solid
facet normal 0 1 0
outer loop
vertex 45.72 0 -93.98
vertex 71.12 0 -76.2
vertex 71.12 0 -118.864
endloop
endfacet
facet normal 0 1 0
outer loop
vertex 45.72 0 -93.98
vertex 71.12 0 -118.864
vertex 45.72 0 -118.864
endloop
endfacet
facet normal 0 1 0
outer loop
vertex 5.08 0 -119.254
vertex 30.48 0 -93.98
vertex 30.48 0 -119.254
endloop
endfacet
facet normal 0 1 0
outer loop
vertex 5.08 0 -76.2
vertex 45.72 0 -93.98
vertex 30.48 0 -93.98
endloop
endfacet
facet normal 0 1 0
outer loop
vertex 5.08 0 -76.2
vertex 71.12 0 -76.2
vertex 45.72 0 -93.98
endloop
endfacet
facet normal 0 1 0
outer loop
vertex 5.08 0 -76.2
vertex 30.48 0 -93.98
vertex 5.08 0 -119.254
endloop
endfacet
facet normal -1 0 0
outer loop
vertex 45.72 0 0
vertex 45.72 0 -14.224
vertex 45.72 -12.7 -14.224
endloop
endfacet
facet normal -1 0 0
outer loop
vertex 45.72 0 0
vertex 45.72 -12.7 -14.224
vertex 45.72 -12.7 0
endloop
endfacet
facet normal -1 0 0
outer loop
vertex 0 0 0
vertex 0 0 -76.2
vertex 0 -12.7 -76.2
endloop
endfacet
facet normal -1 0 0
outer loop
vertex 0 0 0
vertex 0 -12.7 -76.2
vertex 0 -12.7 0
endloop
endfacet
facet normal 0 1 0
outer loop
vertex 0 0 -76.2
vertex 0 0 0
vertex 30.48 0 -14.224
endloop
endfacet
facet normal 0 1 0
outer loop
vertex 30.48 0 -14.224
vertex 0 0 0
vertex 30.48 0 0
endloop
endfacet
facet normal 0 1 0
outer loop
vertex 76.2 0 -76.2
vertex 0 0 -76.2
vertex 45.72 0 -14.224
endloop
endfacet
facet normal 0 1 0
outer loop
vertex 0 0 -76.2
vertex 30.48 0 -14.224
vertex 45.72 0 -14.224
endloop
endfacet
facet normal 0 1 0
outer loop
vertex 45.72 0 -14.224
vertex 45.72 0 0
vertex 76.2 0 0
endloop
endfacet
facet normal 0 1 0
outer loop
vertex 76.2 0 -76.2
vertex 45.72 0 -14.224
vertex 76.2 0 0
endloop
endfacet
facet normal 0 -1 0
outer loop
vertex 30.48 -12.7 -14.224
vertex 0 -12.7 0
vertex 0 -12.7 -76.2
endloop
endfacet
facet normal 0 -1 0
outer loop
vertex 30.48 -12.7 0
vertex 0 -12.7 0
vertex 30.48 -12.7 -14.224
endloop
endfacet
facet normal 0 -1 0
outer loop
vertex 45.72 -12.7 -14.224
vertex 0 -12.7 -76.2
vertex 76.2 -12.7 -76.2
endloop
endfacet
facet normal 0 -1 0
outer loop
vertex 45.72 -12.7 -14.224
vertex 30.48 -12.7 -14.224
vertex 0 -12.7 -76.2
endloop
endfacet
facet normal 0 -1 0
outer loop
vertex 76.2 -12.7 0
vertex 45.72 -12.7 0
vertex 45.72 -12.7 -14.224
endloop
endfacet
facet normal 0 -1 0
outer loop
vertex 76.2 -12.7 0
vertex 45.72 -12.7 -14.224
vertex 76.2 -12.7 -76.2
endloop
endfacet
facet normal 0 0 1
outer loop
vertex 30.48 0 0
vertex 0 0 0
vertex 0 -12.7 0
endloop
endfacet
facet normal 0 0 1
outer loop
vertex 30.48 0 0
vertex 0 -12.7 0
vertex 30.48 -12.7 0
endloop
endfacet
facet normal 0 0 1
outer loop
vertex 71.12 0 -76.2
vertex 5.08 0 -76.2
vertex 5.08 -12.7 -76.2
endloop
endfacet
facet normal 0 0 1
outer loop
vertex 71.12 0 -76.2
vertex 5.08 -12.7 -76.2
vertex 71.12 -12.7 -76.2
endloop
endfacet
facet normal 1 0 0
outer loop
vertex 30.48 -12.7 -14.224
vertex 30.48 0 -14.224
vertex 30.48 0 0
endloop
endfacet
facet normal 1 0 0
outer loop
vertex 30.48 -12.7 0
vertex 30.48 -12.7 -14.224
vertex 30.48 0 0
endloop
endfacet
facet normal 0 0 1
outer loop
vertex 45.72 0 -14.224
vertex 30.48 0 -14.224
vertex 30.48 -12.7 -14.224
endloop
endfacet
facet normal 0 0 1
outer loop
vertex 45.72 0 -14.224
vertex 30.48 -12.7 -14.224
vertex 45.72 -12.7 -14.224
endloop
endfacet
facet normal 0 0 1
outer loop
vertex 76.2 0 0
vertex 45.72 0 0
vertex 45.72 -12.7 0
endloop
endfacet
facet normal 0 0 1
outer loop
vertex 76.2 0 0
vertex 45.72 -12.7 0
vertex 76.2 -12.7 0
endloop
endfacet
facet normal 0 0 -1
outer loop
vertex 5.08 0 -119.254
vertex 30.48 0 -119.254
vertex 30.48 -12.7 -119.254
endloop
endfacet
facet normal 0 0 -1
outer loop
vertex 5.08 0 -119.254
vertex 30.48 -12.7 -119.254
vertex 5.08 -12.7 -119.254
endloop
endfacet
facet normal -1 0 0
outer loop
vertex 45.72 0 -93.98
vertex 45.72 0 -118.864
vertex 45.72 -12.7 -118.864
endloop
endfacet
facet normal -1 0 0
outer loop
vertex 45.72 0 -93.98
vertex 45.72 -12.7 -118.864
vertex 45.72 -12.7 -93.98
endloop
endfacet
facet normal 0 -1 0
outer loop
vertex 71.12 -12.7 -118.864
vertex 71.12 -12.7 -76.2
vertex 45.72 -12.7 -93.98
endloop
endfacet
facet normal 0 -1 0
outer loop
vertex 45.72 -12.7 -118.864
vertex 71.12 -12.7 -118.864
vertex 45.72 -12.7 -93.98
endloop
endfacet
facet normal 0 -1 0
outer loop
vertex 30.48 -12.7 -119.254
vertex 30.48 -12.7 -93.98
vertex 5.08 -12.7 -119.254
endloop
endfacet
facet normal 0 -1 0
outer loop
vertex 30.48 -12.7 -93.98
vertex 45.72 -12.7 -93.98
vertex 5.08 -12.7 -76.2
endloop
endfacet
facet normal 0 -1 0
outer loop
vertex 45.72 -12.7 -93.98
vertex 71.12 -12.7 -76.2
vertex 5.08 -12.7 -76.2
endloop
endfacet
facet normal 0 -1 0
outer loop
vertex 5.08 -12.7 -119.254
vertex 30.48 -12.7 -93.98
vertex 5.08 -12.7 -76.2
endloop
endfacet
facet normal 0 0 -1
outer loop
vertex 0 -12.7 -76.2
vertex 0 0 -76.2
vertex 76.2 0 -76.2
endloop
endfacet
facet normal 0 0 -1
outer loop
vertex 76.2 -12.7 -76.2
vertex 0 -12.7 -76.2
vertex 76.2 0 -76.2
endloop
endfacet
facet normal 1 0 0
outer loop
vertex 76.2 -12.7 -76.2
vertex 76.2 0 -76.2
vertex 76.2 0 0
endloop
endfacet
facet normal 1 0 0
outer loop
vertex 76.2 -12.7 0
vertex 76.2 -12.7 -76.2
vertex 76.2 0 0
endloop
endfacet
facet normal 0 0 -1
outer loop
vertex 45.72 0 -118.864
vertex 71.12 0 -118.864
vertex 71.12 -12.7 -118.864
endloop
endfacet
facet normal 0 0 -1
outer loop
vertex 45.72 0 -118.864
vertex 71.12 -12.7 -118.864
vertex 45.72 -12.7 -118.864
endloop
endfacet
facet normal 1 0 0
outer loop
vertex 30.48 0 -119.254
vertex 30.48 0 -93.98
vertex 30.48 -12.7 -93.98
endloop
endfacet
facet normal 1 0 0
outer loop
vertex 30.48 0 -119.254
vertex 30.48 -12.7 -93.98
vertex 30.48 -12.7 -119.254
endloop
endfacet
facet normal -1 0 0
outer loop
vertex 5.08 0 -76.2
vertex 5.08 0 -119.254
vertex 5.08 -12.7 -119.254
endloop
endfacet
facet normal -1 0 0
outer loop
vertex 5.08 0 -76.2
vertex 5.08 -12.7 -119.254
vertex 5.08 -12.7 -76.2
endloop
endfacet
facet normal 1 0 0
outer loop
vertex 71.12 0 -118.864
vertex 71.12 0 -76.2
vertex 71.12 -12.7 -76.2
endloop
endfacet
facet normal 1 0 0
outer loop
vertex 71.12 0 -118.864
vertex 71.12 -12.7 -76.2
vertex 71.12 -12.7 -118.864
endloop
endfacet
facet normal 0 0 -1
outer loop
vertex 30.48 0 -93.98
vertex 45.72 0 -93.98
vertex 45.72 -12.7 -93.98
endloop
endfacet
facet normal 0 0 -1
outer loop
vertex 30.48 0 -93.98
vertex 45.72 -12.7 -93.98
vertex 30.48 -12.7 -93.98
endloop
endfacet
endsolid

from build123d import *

# Parameters (mm, degrees)
F0_W     = 76.2
F0_H     = 76.2
F1_DEPTH = 12.7
F2_W     = 15.24
F2_H     = 14.224
F3_DEPTH = 25.4
F5_DEPTH = 12.7


with BuildPart() as f1:
    # F0 (on Front) → F1 (new body)
    with BuildSketch(Plane.XZ):
        with Locations((38.1, -38.1)):
            Rectangle(F0_W, F0_H)
    extrude(amount=F1_DEPTH)

    # F2 (on Front) → F3 (cut)
    with BuildSketch(Plane.XZ):
        with Locations((38.1, -7.112)):
            Rectangle(F2_W, F2_H)
    extrude(amount=F3_DEPTH, mode=Mode.SUBTRACT)


with BuildPart() as f5:
    # F4 (on face) → F5 (new body)
    with BuildSketch(Plane(origin=(0, 0, 0), x_dir=(-1, 0, 0), z_dir=(0, 1, 0))):
        Polygon((-5.08, -76.2), (-71.12, -76.2), (-71.12, -118.863896), (-45.72, -118.863896), (-45.72, -93.98), (-30.48, -93.98), (-30.48, -119.254246), (-5.08, -119.254246), align=None)
    extrude(amount=-F5_DEPTH)


solid = Compound([f1.part, f5.part])
